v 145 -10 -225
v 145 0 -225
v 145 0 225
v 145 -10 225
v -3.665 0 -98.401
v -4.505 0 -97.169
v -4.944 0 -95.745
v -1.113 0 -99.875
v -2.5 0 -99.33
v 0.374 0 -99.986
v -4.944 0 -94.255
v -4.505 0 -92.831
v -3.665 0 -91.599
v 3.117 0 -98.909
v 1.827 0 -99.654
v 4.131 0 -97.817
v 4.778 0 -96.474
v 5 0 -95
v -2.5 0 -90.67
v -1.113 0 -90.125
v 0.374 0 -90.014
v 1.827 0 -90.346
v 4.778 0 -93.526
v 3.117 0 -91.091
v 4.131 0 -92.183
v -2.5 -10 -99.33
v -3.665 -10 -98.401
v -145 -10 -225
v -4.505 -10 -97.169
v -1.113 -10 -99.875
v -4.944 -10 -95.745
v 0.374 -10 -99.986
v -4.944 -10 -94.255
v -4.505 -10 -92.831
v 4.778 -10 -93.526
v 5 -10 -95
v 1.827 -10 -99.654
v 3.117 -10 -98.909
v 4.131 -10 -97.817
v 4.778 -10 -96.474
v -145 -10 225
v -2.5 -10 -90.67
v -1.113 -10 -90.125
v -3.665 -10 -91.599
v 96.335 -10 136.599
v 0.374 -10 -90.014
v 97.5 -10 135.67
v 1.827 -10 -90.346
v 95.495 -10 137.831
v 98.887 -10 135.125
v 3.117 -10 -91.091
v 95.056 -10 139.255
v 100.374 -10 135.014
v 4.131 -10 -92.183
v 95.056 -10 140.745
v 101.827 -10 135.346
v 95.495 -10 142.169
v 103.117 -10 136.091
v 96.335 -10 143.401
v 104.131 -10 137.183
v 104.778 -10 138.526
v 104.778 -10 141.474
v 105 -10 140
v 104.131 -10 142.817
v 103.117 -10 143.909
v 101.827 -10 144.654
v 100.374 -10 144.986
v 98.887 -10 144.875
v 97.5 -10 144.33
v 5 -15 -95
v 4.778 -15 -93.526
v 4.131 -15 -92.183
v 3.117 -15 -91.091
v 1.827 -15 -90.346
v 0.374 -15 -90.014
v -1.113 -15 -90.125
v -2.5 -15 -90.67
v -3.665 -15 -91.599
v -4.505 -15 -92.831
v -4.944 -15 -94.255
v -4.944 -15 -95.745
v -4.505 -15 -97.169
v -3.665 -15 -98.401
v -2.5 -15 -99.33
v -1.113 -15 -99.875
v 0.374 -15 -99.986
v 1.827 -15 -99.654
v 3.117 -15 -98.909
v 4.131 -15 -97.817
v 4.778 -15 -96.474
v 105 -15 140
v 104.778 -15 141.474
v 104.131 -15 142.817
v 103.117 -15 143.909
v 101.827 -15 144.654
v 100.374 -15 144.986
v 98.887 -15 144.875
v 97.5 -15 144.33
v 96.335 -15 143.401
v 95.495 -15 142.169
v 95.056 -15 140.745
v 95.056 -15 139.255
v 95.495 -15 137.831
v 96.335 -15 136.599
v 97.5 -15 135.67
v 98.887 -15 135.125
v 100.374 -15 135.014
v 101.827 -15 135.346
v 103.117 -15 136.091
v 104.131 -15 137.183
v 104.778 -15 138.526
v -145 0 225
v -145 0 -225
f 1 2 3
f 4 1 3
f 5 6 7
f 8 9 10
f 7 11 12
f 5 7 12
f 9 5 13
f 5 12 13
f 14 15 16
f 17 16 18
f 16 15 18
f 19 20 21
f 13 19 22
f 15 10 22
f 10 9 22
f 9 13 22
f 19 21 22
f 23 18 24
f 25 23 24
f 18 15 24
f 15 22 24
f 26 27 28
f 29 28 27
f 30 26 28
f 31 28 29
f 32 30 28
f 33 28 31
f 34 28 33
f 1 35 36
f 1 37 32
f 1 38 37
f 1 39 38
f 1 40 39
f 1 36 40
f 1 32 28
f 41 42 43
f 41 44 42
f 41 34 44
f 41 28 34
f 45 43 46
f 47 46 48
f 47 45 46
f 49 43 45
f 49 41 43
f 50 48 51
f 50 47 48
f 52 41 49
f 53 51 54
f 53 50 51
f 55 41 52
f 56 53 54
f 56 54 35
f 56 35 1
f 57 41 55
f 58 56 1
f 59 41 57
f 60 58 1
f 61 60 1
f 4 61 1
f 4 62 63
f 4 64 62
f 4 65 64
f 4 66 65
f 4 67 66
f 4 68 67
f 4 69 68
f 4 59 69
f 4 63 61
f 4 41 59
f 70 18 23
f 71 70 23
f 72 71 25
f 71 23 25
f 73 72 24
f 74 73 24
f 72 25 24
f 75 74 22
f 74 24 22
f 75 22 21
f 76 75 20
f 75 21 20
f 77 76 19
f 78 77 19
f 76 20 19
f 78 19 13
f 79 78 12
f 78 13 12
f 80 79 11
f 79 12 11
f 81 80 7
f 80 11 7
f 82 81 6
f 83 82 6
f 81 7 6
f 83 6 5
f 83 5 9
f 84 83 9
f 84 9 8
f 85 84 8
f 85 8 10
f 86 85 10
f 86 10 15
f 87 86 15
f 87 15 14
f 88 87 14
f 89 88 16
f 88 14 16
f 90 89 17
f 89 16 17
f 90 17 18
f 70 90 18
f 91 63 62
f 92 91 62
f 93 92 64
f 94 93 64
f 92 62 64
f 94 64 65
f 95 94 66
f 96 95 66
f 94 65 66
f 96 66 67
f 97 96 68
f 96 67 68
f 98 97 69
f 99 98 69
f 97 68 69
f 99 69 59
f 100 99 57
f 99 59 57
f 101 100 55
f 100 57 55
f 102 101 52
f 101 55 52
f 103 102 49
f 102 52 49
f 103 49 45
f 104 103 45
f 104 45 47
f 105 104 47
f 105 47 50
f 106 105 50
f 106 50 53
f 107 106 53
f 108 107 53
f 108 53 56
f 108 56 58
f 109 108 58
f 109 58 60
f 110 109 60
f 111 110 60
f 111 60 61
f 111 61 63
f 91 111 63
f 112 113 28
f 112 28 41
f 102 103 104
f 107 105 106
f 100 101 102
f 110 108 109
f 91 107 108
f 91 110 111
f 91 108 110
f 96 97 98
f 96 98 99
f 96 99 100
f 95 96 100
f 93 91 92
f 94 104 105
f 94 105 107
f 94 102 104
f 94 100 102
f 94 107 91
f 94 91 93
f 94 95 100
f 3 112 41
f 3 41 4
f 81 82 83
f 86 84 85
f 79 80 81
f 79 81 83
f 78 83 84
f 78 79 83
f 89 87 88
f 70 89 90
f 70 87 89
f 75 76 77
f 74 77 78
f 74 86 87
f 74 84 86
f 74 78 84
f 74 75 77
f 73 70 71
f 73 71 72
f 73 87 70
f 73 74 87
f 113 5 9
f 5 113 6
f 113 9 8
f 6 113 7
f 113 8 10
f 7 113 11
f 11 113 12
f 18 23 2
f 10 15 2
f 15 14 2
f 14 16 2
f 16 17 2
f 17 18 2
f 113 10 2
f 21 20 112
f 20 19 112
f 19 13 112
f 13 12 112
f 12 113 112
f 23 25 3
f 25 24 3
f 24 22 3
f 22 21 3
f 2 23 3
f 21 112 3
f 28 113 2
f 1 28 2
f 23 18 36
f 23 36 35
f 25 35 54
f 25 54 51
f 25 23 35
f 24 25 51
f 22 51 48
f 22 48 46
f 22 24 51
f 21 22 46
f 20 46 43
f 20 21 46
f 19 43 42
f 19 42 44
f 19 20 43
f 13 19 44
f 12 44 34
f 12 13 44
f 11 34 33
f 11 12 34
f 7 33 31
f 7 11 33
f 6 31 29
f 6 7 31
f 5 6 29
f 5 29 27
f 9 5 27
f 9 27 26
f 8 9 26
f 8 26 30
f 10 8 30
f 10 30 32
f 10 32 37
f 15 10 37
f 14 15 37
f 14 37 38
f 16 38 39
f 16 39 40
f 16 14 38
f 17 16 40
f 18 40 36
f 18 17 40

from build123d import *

# Parameters (mm, degrees)
F0_W     = 290
F0_H     = 450
F0_R     = 5
F1_DEPTH = 10
F2_DEPTH = 15
F3_DEPTH = 15


with BuildPart() as f1:
    # F0 (on Front) → F1 (new body)
    with BuildSketch(Plane.XZ):
        Rectangle(F0_W, F0_H)
        with Locations((0, -95)):
            Circle(F0_R, mode=Mode.SUBTRACT)
        with Locations((100, 140)):
            Circle(F0_R, mode=Mode.SUBTRACT)
    extrude(amount=F1_DEPTH)

    # F0 (on Front) → F2 (join)
    with BuildSketch(Plane.XZ):
        with Locations((100, 140)):
            Circle(F0_R)
    extrude(amount=F2_DEPTH)


with BuildPart() as f3:
    # F0 (on Front) → F3 (new body)
    with BuildSketch(Plane.XZ):
        with Locations((0, -95)):
            Circle(F0_R)
    extrude(amount=F3_DEPTH)


solid = Compound([f1.part, f3.part])
